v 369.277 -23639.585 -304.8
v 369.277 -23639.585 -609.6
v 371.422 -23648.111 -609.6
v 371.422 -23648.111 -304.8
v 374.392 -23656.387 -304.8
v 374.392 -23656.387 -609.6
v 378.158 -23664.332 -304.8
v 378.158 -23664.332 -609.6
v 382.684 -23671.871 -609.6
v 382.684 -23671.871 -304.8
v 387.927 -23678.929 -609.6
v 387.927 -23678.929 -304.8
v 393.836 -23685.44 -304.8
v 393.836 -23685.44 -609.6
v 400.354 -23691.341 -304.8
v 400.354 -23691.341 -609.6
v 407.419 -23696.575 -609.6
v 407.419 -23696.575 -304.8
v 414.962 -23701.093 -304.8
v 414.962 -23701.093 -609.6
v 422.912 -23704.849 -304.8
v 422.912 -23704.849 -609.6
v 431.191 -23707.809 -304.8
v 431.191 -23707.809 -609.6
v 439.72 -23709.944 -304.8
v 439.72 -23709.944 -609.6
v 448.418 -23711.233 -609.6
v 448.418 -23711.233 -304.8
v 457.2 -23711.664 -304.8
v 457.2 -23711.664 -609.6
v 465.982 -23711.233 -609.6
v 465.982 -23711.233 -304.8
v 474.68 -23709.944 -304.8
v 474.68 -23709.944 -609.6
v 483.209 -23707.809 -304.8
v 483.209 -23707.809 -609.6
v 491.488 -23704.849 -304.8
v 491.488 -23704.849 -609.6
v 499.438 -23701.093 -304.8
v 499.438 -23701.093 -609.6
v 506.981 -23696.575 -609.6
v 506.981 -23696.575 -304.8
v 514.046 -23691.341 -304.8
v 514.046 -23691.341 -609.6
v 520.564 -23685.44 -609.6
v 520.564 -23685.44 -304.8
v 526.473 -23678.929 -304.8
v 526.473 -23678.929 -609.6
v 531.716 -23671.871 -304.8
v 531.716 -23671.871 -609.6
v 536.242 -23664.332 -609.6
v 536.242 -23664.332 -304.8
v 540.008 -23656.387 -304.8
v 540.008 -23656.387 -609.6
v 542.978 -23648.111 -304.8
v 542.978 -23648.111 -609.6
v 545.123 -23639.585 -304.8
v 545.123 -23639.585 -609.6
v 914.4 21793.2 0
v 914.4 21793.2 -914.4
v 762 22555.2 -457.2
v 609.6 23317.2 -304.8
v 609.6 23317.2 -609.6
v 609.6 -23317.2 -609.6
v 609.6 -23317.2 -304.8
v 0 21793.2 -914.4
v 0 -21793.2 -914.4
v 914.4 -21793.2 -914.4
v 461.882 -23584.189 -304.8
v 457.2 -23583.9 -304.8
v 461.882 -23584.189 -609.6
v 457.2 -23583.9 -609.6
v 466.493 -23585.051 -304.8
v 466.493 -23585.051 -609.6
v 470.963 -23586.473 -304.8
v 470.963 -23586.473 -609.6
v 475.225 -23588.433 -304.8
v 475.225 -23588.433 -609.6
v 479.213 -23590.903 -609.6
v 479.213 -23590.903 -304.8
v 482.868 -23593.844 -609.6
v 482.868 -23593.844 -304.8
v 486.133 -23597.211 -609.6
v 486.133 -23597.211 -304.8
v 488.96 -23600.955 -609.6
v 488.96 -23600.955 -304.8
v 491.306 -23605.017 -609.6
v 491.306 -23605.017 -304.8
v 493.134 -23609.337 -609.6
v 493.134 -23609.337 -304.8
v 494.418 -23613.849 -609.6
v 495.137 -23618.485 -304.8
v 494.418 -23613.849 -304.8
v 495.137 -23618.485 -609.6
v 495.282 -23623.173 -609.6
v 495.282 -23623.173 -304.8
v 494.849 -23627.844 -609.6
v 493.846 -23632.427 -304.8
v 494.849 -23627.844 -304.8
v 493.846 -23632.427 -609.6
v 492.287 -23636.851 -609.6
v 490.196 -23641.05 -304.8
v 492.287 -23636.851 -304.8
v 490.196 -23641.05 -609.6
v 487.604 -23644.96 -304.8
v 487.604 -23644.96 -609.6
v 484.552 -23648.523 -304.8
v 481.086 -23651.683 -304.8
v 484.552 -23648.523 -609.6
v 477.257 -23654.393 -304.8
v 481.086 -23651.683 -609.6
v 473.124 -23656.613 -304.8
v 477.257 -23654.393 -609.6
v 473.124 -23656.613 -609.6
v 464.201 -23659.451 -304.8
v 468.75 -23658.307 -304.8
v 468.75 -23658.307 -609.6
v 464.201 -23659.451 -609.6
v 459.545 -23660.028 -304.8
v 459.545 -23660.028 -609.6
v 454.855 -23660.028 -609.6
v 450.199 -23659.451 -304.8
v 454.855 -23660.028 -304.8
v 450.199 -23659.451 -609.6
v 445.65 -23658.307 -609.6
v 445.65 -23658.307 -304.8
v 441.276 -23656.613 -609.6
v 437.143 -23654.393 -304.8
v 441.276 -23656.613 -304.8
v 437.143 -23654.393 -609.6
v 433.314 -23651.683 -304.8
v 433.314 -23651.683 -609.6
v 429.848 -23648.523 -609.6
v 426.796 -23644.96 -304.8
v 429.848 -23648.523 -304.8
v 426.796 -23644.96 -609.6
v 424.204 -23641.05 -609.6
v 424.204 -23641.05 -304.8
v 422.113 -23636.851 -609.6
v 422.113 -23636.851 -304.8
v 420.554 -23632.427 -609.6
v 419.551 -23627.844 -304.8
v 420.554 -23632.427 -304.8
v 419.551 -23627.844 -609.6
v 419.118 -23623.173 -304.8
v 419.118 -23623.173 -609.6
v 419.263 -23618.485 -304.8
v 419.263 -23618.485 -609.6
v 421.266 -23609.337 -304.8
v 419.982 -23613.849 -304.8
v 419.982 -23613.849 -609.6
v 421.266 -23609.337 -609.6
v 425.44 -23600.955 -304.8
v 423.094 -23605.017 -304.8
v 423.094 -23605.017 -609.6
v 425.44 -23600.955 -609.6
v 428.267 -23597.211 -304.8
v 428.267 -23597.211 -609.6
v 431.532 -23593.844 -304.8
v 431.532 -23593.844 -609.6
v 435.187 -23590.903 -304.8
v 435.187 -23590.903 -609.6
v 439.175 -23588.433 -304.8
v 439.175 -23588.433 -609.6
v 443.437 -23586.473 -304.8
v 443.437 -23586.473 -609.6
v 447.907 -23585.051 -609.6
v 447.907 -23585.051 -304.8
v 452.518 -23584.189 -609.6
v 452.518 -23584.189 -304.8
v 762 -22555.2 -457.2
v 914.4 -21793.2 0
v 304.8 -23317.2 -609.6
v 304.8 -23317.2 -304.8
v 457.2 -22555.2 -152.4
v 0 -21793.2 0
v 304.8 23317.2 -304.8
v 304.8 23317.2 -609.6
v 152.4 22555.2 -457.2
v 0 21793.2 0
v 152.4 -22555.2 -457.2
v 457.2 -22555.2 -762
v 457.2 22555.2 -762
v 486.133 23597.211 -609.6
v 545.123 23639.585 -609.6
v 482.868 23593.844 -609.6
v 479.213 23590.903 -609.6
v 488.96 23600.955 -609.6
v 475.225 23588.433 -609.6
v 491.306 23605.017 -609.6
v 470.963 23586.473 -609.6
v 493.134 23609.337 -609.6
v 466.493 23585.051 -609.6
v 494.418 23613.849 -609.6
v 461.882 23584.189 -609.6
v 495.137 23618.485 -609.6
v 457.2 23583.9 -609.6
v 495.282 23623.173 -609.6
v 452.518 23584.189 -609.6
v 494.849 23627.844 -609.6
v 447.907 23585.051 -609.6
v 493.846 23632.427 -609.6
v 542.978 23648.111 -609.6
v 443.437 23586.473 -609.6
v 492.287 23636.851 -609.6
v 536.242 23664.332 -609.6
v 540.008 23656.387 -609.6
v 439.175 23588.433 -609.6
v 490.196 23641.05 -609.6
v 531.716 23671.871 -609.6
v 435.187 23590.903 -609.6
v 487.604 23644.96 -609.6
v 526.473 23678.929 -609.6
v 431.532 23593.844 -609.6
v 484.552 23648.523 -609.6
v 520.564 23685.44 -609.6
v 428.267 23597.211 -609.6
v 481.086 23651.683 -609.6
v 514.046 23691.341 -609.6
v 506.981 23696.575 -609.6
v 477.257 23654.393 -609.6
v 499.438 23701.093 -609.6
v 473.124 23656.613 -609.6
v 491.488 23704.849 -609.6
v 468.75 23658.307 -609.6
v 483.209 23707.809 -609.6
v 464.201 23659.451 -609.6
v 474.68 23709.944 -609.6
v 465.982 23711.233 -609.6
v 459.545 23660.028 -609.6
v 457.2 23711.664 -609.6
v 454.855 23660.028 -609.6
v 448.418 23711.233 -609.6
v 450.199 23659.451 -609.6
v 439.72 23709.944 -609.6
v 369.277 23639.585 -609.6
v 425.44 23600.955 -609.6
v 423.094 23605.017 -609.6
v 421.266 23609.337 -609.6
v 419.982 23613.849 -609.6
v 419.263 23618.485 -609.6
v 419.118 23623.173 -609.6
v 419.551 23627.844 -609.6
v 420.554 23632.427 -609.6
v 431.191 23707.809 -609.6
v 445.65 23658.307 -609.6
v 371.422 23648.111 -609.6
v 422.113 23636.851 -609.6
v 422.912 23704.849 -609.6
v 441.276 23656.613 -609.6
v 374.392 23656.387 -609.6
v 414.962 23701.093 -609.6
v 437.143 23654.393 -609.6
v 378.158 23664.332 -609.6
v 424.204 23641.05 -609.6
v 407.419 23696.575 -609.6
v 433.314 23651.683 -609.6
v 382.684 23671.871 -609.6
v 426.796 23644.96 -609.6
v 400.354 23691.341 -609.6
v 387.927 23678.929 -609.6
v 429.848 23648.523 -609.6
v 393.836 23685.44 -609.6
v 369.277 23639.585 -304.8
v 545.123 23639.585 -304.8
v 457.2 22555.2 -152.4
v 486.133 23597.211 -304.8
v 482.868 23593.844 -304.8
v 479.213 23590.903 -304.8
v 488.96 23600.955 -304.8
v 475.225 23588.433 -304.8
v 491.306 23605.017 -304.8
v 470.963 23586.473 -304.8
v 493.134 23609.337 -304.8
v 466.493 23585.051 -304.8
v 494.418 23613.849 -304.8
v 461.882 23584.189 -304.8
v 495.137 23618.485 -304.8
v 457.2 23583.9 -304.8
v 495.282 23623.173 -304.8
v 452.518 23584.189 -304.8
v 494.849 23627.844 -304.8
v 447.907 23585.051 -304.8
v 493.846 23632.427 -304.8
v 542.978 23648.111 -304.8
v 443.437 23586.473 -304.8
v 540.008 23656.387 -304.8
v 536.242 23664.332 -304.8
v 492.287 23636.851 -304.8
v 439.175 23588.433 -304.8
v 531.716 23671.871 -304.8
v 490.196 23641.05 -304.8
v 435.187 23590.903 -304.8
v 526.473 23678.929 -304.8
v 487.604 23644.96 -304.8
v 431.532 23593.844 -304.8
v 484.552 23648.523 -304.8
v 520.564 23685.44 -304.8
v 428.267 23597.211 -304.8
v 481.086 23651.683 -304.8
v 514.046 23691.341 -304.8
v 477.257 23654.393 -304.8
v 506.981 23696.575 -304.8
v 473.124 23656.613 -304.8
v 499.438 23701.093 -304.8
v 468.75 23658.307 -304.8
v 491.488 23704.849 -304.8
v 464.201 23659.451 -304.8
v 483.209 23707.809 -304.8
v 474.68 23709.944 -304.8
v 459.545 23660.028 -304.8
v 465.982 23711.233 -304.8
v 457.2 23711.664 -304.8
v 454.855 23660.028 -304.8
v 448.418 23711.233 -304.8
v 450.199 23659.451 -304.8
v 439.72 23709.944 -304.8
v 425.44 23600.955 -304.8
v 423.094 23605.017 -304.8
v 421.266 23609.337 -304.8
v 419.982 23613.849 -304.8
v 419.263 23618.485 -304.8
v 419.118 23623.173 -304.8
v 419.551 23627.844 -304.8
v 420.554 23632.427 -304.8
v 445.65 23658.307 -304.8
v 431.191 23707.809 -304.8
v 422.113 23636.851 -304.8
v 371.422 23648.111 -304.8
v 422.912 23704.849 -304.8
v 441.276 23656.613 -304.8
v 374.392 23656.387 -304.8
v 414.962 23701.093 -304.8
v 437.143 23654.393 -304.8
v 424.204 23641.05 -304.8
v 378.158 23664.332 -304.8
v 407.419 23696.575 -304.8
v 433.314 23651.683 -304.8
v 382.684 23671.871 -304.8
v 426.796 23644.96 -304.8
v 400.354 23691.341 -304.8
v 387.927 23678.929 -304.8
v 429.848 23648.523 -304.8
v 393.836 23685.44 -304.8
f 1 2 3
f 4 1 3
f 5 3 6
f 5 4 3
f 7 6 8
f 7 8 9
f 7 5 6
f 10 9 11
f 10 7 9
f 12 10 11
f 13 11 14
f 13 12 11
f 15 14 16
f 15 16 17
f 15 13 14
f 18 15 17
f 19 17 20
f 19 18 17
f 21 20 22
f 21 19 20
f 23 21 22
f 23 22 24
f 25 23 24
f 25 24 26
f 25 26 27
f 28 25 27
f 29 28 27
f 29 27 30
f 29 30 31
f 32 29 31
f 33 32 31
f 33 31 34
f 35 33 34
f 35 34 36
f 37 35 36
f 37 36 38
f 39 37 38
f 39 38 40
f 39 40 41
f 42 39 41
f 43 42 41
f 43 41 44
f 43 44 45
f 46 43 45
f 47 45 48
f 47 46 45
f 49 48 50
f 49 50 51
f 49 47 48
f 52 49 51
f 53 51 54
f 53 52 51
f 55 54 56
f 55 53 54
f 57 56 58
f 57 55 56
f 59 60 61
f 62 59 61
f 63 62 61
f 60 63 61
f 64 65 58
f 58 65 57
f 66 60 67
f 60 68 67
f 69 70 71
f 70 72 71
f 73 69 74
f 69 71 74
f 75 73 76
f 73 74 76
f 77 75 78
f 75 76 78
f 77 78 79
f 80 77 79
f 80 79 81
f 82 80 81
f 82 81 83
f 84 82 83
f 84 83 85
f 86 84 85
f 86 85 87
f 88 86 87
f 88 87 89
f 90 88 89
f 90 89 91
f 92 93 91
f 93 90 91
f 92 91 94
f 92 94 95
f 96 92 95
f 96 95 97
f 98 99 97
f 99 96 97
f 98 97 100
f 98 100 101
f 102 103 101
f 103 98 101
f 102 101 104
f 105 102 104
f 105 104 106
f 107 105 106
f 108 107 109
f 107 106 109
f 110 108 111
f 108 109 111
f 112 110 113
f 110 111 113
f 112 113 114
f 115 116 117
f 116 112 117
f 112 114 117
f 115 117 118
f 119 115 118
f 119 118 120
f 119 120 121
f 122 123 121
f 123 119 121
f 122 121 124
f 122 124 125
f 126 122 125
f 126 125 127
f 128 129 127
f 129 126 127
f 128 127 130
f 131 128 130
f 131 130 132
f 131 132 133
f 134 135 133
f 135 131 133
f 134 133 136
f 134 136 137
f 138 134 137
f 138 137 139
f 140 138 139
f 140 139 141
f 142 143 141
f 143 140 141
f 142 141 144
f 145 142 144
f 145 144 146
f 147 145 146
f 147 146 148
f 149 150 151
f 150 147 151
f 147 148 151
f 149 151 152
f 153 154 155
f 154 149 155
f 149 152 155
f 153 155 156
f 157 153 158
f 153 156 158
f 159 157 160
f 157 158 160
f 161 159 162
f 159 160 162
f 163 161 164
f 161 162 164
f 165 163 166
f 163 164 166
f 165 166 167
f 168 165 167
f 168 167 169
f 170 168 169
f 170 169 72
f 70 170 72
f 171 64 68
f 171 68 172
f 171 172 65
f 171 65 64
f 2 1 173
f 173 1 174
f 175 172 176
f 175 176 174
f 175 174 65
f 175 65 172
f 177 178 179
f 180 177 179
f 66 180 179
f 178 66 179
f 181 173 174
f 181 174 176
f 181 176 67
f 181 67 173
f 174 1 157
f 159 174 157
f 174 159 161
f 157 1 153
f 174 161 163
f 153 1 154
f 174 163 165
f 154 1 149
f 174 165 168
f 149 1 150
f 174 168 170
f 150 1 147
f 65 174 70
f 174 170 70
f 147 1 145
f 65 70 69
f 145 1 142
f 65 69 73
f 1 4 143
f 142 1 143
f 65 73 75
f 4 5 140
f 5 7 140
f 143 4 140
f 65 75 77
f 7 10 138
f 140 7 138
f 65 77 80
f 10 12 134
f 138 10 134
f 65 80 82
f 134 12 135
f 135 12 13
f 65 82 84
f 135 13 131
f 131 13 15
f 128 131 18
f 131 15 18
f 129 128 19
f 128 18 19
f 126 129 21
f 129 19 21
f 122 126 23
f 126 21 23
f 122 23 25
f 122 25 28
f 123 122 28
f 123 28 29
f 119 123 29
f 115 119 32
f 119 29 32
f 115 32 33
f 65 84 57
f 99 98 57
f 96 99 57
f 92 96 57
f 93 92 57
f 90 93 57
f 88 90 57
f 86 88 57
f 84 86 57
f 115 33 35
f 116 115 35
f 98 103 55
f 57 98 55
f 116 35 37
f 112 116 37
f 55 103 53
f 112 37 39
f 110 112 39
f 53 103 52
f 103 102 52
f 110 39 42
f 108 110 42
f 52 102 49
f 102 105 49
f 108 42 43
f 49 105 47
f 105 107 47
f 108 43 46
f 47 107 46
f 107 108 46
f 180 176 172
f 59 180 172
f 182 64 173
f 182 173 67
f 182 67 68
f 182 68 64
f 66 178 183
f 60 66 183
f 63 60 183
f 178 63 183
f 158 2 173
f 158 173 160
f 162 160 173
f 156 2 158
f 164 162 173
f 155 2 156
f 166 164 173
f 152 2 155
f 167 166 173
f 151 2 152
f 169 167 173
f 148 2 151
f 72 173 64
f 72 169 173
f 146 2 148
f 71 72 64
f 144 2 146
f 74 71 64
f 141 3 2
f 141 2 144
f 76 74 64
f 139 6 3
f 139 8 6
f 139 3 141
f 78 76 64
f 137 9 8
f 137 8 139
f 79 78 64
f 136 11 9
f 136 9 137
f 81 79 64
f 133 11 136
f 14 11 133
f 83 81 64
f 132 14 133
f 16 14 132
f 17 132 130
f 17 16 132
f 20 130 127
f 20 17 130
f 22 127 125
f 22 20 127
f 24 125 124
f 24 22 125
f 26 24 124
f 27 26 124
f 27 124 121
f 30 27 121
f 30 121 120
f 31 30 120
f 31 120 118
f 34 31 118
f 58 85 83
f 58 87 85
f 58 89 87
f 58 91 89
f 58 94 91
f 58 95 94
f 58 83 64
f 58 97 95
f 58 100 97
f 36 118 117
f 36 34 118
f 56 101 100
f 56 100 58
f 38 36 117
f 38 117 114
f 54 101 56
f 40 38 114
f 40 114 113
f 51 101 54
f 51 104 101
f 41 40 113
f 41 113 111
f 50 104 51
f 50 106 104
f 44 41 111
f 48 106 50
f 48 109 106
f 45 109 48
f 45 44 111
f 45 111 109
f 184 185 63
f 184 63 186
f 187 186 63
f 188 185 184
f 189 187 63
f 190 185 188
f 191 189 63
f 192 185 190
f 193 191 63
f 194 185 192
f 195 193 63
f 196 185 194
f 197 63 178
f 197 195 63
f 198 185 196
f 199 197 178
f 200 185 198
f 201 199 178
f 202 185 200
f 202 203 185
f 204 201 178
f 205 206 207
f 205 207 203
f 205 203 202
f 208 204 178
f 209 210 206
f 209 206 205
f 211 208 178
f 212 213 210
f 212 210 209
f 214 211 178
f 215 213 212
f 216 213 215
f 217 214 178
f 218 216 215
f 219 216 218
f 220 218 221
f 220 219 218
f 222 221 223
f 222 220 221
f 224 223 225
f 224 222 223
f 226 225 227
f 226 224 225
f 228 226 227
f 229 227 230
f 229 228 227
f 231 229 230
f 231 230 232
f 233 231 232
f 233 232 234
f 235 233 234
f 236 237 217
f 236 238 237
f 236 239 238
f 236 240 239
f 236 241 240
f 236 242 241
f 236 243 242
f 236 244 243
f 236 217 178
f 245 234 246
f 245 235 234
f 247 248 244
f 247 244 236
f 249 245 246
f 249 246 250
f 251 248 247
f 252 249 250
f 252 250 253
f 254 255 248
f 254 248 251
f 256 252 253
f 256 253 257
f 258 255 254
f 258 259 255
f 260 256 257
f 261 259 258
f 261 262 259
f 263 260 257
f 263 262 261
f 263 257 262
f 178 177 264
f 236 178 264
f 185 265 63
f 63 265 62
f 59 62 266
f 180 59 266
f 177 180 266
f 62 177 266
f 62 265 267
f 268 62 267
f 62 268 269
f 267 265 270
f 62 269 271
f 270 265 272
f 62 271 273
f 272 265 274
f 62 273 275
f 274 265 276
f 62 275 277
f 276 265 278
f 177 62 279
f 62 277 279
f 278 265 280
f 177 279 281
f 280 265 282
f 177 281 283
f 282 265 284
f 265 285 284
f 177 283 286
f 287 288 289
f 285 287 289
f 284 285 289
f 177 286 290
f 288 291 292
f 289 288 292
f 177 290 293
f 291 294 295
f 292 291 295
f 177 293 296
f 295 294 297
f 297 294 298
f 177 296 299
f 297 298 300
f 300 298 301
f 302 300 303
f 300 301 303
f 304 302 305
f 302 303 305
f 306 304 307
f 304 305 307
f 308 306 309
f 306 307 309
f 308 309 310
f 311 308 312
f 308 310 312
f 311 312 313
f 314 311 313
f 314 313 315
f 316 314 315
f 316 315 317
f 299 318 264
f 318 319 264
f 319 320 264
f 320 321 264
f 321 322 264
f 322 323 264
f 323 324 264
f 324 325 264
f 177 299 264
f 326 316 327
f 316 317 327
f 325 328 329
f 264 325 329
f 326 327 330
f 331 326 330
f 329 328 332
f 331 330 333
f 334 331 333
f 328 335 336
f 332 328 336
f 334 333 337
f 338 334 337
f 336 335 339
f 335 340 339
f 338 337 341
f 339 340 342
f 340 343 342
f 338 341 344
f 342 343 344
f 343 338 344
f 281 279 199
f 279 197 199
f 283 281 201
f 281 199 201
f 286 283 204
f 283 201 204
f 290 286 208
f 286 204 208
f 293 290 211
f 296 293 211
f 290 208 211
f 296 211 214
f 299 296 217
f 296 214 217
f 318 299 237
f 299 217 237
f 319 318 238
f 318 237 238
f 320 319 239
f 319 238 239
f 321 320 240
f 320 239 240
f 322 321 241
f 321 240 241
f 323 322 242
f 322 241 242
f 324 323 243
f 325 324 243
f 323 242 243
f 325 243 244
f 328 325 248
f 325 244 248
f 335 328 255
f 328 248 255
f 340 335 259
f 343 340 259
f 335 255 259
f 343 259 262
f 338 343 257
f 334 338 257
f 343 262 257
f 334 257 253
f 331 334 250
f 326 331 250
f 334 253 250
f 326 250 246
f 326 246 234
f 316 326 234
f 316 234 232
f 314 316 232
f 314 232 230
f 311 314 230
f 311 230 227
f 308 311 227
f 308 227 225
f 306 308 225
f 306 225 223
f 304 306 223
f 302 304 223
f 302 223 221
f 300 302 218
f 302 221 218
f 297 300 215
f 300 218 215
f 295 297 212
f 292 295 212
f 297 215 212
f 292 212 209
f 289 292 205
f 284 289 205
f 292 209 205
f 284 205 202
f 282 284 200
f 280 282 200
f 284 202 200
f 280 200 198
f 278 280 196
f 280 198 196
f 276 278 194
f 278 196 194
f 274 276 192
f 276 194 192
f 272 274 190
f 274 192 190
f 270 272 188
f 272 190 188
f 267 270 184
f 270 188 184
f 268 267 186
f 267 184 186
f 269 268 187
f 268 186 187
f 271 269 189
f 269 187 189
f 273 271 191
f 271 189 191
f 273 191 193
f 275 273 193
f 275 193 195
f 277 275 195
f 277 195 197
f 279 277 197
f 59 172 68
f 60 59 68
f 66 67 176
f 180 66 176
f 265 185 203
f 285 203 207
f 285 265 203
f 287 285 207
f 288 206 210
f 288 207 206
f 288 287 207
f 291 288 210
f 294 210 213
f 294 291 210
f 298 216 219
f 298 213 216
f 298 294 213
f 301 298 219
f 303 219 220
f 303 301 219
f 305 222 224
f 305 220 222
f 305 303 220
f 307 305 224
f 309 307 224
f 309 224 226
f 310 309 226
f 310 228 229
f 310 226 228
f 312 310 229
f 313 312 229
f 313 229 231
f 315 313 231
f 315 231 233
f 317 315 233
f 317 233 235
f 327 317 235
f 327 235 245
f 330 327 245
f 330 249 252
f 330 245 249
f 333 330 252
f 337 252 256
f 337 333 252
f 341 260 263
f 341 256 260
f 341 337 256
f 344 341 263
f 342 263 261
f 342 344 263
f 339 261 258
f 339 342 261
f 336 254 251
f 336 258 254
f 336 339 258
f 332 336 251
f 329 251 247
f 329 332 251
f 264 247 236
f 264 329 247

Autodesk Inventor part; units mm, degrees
ref_plane "YZ Plane" through (0, 0, 0) normal (1, 0, 0) x (0, 1, 0)
sketch "Sketch5" plane through (0, 0, 0) normal (0, 1, 0) x (-1, 0, 0)
  line L0 (0, 0) -> (-914.4, 0)
  line L1 (-914.4, 0) -> (-914.4, -914.4)
  line L2 (-914.4, -914.4) -> (0, -914.4)
  line L3 (0, -914.4) -> (0, 0)
  dimension "d26" = 914.4
  dimension "d27" = 914.4
extrude "Extrusion3" add sketch "Sketch5" along normal mid plane 43586.4
ref_plane "Work Plane4" through (0, 23317.2, 0) normal (0, 1, 0) x (1, 0, 0)
sketch "Sketch6" plane through (0, 23317.2, 0) normal (0, 1, 0) x (1, 0, 0)
  line L0 (609.6, 304.8) -> (304.8, 304.8)
  line L1 (304.8, 304.8) -> (304.8, 609.6)
  line L2 (304.8, 609.6) -> (609.6, 609.6)
  line L3 (609.6, 609.6) -> (609.6, 304.8)
  line L4 (914.4, 914.4) -> (0, 914.4) projected
  line L5 (914.4, 0) -> (914.4, 914.4) projected
  point P0 (0, 0)
  dimension "d31" = 304.8
  dimension "d32" = 304.8
  dimension "d33" = 304.8
  dimension "d34" = 304.8
loft "Loft3" add profiles "Sketch6" section 1 edges at (457.2, 21793.2, 0) (914.4, 21793.2, -457.2) (457.2, 21793.2, -914.4) (0, 21793.2, -457.2)
ref_plane "Work Plane5" through (609.6, 23317.2, -304.8) normal (0, 0, -1) x (-1, 0, 0)
sketch "Sketch7" plane through (609.6, 23317.2, -304.8) normal (0, 0, -1) x (-1, 0, 0)
  line L0 (609.6, -1524) -> (304.8, 0) projected
  line L1 (0, 0) -> (304.8, 0) projected
  line L2 (-304.8, -1524) -> (0, 0) projected
  line L3 (304.8, 0) -> (0, 0) projected
  line L4 (304.8, 0) -> (240.3231, 322.3846)
  arc A0 (240.3231, 322.3846) -> (64.4769, 322.3846) centre (152.4, 304.8) ccw
  line L5 (-304.8, -1524) -> (0, 0) projected
  line L6 (64.4769, 322.3846) -> (0, 0)
  point P0 (609.6, -23317.2)
  dimension "d40" = 304.8
extrude "Extrusion4" add sketch "Sketch7" along normal up to surface (304.8 mm away)
hole "Hole1" at (457.2, 23622, -304.8) direction (0, 0, -1) diameter 76.2 end through all
mirror "Mirror1" about plane through (0, 0, 0) normal (0, 1, 0) of "Loft3", "Extrusion4", "Hole1"
ref_plane "Work Plane6" through (0, -23317.2, 0) normal (0, 1, 0) x (1, 0, 0)
ref_plane "Work Plane7" through (609.6, -23317.2, -304.8) normal (0, 0, 1) x (-1, 0, 0)
properties part number "MM Support B" material "Iron, Malleable"
